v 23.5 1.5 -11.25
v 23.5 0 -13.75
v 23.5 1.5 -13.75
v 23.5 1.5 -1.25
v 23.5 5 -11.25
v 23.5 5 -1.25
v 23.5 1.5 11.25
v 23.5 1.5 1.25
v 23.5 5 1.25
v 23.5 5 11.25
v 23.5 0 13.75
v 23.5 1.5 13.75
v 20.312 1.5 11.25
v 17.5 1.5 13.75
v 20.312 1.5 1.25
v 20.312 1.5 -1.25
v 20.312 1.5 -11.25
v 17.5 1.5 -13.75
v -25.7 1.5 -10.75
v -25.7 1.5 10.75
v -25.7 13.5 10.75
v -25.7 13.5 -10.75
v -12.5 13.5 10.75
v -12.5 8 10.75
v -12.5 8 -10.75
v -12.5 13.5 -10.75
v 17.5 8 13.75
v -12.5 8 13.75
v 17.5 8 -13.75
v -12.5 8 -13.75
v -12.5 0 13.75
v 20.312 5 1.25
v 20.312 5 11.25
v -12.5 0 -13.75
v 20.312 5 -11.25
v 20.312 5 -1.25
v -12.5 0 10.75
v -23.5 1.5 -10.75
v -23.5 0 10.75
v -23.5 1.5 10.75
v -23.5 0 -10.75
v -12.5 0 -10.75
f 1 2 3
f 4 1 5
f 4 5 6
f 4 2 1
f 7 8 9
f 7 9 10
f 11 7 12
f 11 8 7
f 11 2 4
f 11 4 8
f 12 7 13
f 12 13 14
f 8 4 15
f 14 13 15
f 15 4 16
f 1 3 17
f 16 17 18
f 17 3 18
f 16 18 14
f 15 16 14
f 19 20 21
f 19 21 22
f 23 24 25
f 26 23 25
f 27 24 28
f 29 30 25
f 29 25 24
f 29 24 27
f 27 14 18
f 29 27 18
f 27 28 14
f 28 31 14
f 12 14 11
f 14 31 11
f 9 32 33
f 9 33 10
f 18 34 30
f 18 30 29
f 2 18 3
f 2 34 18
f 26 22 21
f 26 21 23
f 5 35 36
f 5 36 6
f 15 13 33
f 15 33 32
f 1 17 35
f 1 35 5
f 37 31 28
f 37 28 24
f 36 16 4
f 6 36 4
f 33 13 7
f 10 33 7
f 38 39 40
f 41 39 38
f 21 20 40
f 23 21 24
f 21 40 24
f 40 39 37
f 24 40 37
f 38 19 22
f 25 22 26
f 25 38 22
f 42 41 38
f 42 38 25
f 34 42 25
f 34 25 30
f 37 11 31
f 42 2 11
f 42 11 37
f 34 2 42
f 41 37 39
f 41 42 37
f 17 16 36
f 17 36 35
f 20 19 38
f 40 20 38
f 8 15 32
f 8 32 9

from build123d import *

# Parameters (mm, degrees)
EXTRUDE_1_DEPTH = 1.5
SKETCH_2_W      = 30
SKETCH_2_H      = 27.5
EXTRUDE_2_DEPTH = 6.5
SKETCH_3_W      = 13.2
SKETCH_3_H      = 21.5
EXTRUDE_3_DEPTH = 12
SKETCH_4_W      = 3.188486523
SKETCH_4_H      = 10
EXTRUDE_4_DEPTH = 3.5


with BuildPart() as part:
    # 草图1 → 凸台-拉伸1 (new body)
    with BuildSketch(Plane(origin=(0, 0, 0), x_dir=(1, 0, 0), z_dir=(0, 1, 0))):
        Polygon((-23.5, 10.75), (-12.5, 10.75), (-12.5, 13.75), (23.5, 13.75), (23.5, -13.75), (-12.5, -13.75), (-12.5, -10.75), (-23.5, -10.75), align=None)
    extrude(amount=EXTRUDE_1_DEPTH)

    # 草图2 → 凸台-拉伸2 (add)
    with BuildSketch(Plane(origin=(0, 1.5, 0), x_dir=(1, 0, 0), z_dir=(0, 1, 0))):
        with Locations((2.5, 0)):
            Rectangle(SKETCH_2_W, SKETCH_2_H)
    extrude(amount=EXTRUDE_2_DEPTH)

    # 草图3 → 凸台-拉伸3 (add)
    with BuildSketch(Plane(origin=(0, 1.5, 0), x_dir=(1, 0, 0), z_dir=(0, 1, 0))):
        with Locations((-19.1, 0)):
            Rectangle(SKETCH_3_W, SKETCH_3_H)
    extrude(amount=EXTRUDE_3_DEPTH)

    # 草图4 → 凸台-拉伸4 (add)
    with BuildSketch(Plane(origin=(0, 1.5, 0), x_dir=(1, 0, 0), z_dir=(0, 1, 0))):
        with Locations((21.905756739, 6.25)):
            Rectangle(SKETCH_4_W, SKETCH_4_H)
        with Locations((21.905756739, -6.25)):
            Rectangle(SKETCH_4_W, SKETCH_4_H)
    extrude(amount=EXTRUDE_4_DEPTH)


solid = part.part
